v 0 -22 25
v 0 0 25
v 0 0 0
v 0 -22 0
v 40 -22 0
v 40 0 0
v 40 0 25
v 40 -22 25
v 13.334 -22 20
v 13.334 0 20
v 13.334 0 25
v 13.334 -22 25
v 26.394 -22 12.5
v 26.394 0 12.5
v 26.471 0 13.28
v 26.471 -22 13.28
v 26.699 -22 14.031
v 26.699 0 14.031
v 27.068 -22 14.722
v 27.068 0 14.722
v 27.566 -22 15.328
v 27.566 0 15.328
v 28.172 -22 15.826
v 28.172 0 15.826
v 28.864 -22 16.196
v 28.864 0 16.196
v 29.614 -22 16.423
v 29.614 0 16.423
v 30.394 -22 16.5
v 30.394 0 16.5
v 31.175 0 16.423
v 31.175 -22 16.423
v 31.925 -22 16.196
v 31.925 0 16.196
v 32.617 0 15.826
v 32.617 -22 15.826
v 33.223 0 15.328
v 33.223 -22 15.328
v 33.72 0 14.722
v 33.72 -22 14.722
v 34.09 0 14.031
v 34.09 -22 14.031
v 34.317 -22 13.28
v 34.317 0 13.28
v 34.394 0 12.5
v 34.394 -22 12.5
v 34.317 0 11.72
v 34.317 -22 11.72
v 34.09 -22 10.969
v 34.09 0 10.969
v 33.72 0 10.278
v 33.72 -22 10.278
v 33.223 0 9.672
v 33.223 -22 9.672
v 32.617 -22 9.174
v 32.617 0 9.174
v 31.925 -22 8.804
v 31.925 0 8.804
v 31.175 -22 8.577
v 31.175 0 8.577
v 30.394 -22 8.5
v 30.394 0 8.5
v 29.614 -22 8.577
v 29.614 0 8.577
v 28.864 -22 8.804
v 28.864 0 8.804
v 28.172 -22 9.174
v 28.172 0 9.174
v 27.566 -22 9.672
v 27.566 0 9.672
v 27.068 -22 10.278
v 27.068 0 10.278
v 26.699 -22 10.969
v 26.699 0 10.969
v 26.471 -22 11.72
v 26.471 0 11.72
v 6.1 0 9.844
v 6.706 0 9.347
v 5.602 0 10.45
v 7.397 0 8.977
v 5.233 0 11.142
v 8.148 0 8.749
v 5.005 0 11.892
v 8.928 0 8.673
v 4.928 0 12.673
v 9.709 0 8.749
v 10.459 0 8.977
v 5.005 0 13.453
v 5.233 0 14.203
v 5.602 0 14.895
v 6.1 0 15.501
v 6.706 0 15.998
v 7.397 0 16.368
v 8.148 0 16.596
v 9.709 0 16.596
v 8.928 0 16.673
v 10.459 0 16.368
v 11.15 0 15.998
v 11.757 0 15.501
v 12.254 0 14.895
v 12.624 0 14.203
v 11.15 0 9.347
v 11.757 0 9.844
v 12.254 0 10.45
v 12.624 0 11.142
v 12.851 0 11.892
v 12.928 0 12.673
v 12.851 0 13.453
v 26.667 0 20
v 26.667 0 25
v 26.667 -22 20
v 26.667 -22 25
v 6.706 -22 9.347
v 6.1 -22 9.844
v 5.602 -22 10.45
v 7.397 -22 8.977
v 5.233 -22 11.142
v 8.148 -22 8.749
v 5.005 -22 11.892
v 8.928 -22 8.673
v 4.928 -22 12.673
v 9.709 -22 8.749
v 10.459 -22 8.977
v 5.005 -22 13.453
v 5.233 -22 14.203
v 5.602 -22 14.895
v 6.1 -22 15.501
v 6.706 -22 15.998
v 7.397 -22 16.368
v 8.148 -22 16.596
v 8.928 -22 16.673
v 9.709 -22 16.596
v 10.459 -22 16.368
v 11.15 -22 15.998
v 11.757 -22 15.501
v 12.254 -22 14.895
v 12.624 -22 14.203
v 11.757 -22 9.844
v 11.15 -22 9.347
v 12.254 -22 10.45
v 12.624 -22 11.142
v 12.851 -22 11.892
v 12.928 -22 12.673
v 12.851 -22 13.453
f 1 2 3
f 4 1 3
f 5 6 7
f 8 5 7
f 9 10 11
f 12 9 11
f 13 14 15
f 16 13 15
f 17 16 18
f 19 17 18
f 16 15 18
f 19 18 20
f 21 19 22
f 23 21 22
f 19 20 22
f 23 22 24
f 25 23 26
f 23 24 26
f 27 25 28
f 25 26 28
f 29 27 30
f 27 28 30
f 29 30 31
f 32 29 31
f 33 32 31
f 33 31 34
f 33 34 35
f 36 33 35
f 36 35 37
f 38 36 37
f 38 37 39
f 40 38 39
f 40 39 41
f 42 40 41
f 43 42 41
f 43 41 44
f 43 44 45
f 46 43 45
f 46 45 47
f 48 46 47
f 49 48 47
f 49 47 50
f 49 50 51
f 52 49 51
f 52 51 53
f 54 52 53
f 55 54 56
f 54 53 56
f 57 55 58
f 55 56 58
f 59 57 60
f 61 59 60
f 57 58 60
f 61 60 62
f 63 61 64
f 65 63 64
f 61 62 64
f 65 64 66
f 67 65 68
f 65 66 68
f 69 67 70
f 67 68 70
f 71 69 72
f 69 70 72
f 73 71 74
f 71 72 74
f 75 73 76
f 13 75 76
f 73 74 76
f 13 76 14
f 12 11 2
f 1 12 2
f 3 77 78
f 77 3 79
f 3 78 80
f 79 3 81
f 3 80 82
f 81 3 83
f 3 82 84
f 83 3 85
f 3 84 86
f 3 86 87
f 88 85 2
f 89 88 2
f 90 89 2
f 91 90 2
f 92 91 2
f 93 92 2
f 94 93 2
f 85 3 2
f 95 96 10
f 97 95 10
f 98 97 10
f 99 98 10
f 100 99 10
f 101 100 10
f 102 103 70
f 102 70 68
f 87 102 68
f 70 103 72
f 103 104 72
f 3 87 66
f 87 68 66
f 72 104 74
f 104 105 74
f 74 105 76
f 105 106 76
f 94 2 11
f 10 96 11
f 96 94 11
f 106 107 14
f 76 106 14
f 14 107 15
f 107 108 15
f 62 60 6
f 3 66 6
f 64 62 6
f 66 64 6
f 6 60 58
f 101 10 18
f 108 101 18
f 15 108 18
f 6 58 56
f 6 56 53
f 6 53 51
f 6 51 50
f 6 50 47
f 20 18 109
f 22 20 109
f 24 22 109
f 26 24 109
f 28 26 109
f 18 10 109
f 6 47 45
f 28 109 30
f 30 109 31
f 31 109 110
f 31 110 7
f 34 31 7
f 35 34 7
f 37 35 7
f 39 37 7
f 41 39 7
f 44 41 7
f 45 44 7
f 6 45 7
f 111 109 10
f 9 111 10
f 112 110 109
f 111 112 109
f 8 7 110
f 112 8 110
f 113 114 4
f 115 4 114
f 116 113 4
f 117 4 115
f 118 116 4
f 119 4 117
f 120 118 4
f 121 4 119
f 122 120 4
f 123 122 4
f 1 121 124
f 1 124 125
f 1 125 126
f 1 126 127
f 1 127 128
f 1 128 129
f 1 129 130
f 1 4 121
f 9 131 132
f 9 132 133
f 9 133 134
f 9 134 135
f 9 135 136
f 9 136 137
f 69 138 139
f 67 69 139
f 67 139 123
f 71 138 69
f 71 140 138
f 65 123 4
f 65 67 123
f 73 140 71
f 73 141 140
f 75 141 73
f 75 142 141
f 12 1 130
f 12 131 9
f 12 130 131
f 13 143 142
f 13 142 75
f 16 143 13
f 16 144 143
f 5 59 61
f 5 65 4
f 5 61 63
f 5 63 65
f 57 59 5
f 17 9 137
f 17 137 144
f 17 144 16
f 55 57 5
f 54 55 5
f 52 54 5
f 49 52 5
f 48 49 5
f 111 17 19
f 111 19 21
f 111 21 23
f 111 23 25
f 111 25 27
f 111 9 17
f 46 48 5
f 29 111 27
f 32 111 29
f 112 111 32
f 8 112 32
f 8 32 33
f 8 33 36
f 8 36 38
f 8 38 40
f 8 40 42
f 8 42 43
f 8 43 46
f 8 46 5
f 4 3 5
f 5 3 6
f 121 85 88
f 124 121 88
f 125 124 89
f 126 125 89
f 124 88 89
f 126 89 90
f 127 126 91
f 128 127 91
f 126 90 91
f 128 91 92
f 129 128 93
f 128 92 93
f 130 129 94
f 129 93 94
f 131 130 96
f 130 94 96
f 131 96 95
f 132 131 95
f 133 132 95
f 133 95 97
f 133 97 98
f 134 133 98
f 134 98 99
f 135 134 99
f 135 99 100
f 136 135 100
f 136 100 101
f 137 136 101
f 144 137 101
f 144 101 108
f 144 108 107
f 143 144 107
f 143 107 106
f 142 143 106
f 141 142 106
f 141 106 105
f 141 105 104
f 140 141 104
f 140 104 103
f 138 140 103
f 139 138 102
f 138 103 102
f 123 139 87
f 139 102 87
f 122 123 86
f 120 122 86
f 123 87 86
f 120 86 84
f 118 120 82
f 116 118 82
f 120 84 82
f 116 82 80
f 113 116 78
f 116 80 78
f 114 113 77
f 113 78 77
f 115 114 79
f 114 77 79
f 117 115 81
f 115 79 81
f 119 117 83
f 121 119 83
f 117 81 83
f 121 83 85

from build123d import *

# Parameters (mm, degrees)
F1_DEPTH = 22
F3_D     = 8
F5_D     = 8


with BuildPart() as f1:
    # F0 (on Front) → F1 (new body)
    with BuildSketch(Plane.XZ):
        Polygon((0, 25), (0, 0), (40, 0), (40, 25), (26.6667, 25), (26.6667, 20), (13.3337, 20), (13.3337, 25), align=None)
    extrude(amount=F1_DEPTH)

    # F3 (through all)
    with Locations(Plane.XZ.offset(22)):
        with Locations((8.928183, 12.672609)):
            Hole(F3_D / 2)

    # F5 (through all)
    with Locations(Plane.XZ.offset(22)):
        with Locations((30.394303, 12.5)):
            Hole(F5_D / 2)


solid = f1.part
